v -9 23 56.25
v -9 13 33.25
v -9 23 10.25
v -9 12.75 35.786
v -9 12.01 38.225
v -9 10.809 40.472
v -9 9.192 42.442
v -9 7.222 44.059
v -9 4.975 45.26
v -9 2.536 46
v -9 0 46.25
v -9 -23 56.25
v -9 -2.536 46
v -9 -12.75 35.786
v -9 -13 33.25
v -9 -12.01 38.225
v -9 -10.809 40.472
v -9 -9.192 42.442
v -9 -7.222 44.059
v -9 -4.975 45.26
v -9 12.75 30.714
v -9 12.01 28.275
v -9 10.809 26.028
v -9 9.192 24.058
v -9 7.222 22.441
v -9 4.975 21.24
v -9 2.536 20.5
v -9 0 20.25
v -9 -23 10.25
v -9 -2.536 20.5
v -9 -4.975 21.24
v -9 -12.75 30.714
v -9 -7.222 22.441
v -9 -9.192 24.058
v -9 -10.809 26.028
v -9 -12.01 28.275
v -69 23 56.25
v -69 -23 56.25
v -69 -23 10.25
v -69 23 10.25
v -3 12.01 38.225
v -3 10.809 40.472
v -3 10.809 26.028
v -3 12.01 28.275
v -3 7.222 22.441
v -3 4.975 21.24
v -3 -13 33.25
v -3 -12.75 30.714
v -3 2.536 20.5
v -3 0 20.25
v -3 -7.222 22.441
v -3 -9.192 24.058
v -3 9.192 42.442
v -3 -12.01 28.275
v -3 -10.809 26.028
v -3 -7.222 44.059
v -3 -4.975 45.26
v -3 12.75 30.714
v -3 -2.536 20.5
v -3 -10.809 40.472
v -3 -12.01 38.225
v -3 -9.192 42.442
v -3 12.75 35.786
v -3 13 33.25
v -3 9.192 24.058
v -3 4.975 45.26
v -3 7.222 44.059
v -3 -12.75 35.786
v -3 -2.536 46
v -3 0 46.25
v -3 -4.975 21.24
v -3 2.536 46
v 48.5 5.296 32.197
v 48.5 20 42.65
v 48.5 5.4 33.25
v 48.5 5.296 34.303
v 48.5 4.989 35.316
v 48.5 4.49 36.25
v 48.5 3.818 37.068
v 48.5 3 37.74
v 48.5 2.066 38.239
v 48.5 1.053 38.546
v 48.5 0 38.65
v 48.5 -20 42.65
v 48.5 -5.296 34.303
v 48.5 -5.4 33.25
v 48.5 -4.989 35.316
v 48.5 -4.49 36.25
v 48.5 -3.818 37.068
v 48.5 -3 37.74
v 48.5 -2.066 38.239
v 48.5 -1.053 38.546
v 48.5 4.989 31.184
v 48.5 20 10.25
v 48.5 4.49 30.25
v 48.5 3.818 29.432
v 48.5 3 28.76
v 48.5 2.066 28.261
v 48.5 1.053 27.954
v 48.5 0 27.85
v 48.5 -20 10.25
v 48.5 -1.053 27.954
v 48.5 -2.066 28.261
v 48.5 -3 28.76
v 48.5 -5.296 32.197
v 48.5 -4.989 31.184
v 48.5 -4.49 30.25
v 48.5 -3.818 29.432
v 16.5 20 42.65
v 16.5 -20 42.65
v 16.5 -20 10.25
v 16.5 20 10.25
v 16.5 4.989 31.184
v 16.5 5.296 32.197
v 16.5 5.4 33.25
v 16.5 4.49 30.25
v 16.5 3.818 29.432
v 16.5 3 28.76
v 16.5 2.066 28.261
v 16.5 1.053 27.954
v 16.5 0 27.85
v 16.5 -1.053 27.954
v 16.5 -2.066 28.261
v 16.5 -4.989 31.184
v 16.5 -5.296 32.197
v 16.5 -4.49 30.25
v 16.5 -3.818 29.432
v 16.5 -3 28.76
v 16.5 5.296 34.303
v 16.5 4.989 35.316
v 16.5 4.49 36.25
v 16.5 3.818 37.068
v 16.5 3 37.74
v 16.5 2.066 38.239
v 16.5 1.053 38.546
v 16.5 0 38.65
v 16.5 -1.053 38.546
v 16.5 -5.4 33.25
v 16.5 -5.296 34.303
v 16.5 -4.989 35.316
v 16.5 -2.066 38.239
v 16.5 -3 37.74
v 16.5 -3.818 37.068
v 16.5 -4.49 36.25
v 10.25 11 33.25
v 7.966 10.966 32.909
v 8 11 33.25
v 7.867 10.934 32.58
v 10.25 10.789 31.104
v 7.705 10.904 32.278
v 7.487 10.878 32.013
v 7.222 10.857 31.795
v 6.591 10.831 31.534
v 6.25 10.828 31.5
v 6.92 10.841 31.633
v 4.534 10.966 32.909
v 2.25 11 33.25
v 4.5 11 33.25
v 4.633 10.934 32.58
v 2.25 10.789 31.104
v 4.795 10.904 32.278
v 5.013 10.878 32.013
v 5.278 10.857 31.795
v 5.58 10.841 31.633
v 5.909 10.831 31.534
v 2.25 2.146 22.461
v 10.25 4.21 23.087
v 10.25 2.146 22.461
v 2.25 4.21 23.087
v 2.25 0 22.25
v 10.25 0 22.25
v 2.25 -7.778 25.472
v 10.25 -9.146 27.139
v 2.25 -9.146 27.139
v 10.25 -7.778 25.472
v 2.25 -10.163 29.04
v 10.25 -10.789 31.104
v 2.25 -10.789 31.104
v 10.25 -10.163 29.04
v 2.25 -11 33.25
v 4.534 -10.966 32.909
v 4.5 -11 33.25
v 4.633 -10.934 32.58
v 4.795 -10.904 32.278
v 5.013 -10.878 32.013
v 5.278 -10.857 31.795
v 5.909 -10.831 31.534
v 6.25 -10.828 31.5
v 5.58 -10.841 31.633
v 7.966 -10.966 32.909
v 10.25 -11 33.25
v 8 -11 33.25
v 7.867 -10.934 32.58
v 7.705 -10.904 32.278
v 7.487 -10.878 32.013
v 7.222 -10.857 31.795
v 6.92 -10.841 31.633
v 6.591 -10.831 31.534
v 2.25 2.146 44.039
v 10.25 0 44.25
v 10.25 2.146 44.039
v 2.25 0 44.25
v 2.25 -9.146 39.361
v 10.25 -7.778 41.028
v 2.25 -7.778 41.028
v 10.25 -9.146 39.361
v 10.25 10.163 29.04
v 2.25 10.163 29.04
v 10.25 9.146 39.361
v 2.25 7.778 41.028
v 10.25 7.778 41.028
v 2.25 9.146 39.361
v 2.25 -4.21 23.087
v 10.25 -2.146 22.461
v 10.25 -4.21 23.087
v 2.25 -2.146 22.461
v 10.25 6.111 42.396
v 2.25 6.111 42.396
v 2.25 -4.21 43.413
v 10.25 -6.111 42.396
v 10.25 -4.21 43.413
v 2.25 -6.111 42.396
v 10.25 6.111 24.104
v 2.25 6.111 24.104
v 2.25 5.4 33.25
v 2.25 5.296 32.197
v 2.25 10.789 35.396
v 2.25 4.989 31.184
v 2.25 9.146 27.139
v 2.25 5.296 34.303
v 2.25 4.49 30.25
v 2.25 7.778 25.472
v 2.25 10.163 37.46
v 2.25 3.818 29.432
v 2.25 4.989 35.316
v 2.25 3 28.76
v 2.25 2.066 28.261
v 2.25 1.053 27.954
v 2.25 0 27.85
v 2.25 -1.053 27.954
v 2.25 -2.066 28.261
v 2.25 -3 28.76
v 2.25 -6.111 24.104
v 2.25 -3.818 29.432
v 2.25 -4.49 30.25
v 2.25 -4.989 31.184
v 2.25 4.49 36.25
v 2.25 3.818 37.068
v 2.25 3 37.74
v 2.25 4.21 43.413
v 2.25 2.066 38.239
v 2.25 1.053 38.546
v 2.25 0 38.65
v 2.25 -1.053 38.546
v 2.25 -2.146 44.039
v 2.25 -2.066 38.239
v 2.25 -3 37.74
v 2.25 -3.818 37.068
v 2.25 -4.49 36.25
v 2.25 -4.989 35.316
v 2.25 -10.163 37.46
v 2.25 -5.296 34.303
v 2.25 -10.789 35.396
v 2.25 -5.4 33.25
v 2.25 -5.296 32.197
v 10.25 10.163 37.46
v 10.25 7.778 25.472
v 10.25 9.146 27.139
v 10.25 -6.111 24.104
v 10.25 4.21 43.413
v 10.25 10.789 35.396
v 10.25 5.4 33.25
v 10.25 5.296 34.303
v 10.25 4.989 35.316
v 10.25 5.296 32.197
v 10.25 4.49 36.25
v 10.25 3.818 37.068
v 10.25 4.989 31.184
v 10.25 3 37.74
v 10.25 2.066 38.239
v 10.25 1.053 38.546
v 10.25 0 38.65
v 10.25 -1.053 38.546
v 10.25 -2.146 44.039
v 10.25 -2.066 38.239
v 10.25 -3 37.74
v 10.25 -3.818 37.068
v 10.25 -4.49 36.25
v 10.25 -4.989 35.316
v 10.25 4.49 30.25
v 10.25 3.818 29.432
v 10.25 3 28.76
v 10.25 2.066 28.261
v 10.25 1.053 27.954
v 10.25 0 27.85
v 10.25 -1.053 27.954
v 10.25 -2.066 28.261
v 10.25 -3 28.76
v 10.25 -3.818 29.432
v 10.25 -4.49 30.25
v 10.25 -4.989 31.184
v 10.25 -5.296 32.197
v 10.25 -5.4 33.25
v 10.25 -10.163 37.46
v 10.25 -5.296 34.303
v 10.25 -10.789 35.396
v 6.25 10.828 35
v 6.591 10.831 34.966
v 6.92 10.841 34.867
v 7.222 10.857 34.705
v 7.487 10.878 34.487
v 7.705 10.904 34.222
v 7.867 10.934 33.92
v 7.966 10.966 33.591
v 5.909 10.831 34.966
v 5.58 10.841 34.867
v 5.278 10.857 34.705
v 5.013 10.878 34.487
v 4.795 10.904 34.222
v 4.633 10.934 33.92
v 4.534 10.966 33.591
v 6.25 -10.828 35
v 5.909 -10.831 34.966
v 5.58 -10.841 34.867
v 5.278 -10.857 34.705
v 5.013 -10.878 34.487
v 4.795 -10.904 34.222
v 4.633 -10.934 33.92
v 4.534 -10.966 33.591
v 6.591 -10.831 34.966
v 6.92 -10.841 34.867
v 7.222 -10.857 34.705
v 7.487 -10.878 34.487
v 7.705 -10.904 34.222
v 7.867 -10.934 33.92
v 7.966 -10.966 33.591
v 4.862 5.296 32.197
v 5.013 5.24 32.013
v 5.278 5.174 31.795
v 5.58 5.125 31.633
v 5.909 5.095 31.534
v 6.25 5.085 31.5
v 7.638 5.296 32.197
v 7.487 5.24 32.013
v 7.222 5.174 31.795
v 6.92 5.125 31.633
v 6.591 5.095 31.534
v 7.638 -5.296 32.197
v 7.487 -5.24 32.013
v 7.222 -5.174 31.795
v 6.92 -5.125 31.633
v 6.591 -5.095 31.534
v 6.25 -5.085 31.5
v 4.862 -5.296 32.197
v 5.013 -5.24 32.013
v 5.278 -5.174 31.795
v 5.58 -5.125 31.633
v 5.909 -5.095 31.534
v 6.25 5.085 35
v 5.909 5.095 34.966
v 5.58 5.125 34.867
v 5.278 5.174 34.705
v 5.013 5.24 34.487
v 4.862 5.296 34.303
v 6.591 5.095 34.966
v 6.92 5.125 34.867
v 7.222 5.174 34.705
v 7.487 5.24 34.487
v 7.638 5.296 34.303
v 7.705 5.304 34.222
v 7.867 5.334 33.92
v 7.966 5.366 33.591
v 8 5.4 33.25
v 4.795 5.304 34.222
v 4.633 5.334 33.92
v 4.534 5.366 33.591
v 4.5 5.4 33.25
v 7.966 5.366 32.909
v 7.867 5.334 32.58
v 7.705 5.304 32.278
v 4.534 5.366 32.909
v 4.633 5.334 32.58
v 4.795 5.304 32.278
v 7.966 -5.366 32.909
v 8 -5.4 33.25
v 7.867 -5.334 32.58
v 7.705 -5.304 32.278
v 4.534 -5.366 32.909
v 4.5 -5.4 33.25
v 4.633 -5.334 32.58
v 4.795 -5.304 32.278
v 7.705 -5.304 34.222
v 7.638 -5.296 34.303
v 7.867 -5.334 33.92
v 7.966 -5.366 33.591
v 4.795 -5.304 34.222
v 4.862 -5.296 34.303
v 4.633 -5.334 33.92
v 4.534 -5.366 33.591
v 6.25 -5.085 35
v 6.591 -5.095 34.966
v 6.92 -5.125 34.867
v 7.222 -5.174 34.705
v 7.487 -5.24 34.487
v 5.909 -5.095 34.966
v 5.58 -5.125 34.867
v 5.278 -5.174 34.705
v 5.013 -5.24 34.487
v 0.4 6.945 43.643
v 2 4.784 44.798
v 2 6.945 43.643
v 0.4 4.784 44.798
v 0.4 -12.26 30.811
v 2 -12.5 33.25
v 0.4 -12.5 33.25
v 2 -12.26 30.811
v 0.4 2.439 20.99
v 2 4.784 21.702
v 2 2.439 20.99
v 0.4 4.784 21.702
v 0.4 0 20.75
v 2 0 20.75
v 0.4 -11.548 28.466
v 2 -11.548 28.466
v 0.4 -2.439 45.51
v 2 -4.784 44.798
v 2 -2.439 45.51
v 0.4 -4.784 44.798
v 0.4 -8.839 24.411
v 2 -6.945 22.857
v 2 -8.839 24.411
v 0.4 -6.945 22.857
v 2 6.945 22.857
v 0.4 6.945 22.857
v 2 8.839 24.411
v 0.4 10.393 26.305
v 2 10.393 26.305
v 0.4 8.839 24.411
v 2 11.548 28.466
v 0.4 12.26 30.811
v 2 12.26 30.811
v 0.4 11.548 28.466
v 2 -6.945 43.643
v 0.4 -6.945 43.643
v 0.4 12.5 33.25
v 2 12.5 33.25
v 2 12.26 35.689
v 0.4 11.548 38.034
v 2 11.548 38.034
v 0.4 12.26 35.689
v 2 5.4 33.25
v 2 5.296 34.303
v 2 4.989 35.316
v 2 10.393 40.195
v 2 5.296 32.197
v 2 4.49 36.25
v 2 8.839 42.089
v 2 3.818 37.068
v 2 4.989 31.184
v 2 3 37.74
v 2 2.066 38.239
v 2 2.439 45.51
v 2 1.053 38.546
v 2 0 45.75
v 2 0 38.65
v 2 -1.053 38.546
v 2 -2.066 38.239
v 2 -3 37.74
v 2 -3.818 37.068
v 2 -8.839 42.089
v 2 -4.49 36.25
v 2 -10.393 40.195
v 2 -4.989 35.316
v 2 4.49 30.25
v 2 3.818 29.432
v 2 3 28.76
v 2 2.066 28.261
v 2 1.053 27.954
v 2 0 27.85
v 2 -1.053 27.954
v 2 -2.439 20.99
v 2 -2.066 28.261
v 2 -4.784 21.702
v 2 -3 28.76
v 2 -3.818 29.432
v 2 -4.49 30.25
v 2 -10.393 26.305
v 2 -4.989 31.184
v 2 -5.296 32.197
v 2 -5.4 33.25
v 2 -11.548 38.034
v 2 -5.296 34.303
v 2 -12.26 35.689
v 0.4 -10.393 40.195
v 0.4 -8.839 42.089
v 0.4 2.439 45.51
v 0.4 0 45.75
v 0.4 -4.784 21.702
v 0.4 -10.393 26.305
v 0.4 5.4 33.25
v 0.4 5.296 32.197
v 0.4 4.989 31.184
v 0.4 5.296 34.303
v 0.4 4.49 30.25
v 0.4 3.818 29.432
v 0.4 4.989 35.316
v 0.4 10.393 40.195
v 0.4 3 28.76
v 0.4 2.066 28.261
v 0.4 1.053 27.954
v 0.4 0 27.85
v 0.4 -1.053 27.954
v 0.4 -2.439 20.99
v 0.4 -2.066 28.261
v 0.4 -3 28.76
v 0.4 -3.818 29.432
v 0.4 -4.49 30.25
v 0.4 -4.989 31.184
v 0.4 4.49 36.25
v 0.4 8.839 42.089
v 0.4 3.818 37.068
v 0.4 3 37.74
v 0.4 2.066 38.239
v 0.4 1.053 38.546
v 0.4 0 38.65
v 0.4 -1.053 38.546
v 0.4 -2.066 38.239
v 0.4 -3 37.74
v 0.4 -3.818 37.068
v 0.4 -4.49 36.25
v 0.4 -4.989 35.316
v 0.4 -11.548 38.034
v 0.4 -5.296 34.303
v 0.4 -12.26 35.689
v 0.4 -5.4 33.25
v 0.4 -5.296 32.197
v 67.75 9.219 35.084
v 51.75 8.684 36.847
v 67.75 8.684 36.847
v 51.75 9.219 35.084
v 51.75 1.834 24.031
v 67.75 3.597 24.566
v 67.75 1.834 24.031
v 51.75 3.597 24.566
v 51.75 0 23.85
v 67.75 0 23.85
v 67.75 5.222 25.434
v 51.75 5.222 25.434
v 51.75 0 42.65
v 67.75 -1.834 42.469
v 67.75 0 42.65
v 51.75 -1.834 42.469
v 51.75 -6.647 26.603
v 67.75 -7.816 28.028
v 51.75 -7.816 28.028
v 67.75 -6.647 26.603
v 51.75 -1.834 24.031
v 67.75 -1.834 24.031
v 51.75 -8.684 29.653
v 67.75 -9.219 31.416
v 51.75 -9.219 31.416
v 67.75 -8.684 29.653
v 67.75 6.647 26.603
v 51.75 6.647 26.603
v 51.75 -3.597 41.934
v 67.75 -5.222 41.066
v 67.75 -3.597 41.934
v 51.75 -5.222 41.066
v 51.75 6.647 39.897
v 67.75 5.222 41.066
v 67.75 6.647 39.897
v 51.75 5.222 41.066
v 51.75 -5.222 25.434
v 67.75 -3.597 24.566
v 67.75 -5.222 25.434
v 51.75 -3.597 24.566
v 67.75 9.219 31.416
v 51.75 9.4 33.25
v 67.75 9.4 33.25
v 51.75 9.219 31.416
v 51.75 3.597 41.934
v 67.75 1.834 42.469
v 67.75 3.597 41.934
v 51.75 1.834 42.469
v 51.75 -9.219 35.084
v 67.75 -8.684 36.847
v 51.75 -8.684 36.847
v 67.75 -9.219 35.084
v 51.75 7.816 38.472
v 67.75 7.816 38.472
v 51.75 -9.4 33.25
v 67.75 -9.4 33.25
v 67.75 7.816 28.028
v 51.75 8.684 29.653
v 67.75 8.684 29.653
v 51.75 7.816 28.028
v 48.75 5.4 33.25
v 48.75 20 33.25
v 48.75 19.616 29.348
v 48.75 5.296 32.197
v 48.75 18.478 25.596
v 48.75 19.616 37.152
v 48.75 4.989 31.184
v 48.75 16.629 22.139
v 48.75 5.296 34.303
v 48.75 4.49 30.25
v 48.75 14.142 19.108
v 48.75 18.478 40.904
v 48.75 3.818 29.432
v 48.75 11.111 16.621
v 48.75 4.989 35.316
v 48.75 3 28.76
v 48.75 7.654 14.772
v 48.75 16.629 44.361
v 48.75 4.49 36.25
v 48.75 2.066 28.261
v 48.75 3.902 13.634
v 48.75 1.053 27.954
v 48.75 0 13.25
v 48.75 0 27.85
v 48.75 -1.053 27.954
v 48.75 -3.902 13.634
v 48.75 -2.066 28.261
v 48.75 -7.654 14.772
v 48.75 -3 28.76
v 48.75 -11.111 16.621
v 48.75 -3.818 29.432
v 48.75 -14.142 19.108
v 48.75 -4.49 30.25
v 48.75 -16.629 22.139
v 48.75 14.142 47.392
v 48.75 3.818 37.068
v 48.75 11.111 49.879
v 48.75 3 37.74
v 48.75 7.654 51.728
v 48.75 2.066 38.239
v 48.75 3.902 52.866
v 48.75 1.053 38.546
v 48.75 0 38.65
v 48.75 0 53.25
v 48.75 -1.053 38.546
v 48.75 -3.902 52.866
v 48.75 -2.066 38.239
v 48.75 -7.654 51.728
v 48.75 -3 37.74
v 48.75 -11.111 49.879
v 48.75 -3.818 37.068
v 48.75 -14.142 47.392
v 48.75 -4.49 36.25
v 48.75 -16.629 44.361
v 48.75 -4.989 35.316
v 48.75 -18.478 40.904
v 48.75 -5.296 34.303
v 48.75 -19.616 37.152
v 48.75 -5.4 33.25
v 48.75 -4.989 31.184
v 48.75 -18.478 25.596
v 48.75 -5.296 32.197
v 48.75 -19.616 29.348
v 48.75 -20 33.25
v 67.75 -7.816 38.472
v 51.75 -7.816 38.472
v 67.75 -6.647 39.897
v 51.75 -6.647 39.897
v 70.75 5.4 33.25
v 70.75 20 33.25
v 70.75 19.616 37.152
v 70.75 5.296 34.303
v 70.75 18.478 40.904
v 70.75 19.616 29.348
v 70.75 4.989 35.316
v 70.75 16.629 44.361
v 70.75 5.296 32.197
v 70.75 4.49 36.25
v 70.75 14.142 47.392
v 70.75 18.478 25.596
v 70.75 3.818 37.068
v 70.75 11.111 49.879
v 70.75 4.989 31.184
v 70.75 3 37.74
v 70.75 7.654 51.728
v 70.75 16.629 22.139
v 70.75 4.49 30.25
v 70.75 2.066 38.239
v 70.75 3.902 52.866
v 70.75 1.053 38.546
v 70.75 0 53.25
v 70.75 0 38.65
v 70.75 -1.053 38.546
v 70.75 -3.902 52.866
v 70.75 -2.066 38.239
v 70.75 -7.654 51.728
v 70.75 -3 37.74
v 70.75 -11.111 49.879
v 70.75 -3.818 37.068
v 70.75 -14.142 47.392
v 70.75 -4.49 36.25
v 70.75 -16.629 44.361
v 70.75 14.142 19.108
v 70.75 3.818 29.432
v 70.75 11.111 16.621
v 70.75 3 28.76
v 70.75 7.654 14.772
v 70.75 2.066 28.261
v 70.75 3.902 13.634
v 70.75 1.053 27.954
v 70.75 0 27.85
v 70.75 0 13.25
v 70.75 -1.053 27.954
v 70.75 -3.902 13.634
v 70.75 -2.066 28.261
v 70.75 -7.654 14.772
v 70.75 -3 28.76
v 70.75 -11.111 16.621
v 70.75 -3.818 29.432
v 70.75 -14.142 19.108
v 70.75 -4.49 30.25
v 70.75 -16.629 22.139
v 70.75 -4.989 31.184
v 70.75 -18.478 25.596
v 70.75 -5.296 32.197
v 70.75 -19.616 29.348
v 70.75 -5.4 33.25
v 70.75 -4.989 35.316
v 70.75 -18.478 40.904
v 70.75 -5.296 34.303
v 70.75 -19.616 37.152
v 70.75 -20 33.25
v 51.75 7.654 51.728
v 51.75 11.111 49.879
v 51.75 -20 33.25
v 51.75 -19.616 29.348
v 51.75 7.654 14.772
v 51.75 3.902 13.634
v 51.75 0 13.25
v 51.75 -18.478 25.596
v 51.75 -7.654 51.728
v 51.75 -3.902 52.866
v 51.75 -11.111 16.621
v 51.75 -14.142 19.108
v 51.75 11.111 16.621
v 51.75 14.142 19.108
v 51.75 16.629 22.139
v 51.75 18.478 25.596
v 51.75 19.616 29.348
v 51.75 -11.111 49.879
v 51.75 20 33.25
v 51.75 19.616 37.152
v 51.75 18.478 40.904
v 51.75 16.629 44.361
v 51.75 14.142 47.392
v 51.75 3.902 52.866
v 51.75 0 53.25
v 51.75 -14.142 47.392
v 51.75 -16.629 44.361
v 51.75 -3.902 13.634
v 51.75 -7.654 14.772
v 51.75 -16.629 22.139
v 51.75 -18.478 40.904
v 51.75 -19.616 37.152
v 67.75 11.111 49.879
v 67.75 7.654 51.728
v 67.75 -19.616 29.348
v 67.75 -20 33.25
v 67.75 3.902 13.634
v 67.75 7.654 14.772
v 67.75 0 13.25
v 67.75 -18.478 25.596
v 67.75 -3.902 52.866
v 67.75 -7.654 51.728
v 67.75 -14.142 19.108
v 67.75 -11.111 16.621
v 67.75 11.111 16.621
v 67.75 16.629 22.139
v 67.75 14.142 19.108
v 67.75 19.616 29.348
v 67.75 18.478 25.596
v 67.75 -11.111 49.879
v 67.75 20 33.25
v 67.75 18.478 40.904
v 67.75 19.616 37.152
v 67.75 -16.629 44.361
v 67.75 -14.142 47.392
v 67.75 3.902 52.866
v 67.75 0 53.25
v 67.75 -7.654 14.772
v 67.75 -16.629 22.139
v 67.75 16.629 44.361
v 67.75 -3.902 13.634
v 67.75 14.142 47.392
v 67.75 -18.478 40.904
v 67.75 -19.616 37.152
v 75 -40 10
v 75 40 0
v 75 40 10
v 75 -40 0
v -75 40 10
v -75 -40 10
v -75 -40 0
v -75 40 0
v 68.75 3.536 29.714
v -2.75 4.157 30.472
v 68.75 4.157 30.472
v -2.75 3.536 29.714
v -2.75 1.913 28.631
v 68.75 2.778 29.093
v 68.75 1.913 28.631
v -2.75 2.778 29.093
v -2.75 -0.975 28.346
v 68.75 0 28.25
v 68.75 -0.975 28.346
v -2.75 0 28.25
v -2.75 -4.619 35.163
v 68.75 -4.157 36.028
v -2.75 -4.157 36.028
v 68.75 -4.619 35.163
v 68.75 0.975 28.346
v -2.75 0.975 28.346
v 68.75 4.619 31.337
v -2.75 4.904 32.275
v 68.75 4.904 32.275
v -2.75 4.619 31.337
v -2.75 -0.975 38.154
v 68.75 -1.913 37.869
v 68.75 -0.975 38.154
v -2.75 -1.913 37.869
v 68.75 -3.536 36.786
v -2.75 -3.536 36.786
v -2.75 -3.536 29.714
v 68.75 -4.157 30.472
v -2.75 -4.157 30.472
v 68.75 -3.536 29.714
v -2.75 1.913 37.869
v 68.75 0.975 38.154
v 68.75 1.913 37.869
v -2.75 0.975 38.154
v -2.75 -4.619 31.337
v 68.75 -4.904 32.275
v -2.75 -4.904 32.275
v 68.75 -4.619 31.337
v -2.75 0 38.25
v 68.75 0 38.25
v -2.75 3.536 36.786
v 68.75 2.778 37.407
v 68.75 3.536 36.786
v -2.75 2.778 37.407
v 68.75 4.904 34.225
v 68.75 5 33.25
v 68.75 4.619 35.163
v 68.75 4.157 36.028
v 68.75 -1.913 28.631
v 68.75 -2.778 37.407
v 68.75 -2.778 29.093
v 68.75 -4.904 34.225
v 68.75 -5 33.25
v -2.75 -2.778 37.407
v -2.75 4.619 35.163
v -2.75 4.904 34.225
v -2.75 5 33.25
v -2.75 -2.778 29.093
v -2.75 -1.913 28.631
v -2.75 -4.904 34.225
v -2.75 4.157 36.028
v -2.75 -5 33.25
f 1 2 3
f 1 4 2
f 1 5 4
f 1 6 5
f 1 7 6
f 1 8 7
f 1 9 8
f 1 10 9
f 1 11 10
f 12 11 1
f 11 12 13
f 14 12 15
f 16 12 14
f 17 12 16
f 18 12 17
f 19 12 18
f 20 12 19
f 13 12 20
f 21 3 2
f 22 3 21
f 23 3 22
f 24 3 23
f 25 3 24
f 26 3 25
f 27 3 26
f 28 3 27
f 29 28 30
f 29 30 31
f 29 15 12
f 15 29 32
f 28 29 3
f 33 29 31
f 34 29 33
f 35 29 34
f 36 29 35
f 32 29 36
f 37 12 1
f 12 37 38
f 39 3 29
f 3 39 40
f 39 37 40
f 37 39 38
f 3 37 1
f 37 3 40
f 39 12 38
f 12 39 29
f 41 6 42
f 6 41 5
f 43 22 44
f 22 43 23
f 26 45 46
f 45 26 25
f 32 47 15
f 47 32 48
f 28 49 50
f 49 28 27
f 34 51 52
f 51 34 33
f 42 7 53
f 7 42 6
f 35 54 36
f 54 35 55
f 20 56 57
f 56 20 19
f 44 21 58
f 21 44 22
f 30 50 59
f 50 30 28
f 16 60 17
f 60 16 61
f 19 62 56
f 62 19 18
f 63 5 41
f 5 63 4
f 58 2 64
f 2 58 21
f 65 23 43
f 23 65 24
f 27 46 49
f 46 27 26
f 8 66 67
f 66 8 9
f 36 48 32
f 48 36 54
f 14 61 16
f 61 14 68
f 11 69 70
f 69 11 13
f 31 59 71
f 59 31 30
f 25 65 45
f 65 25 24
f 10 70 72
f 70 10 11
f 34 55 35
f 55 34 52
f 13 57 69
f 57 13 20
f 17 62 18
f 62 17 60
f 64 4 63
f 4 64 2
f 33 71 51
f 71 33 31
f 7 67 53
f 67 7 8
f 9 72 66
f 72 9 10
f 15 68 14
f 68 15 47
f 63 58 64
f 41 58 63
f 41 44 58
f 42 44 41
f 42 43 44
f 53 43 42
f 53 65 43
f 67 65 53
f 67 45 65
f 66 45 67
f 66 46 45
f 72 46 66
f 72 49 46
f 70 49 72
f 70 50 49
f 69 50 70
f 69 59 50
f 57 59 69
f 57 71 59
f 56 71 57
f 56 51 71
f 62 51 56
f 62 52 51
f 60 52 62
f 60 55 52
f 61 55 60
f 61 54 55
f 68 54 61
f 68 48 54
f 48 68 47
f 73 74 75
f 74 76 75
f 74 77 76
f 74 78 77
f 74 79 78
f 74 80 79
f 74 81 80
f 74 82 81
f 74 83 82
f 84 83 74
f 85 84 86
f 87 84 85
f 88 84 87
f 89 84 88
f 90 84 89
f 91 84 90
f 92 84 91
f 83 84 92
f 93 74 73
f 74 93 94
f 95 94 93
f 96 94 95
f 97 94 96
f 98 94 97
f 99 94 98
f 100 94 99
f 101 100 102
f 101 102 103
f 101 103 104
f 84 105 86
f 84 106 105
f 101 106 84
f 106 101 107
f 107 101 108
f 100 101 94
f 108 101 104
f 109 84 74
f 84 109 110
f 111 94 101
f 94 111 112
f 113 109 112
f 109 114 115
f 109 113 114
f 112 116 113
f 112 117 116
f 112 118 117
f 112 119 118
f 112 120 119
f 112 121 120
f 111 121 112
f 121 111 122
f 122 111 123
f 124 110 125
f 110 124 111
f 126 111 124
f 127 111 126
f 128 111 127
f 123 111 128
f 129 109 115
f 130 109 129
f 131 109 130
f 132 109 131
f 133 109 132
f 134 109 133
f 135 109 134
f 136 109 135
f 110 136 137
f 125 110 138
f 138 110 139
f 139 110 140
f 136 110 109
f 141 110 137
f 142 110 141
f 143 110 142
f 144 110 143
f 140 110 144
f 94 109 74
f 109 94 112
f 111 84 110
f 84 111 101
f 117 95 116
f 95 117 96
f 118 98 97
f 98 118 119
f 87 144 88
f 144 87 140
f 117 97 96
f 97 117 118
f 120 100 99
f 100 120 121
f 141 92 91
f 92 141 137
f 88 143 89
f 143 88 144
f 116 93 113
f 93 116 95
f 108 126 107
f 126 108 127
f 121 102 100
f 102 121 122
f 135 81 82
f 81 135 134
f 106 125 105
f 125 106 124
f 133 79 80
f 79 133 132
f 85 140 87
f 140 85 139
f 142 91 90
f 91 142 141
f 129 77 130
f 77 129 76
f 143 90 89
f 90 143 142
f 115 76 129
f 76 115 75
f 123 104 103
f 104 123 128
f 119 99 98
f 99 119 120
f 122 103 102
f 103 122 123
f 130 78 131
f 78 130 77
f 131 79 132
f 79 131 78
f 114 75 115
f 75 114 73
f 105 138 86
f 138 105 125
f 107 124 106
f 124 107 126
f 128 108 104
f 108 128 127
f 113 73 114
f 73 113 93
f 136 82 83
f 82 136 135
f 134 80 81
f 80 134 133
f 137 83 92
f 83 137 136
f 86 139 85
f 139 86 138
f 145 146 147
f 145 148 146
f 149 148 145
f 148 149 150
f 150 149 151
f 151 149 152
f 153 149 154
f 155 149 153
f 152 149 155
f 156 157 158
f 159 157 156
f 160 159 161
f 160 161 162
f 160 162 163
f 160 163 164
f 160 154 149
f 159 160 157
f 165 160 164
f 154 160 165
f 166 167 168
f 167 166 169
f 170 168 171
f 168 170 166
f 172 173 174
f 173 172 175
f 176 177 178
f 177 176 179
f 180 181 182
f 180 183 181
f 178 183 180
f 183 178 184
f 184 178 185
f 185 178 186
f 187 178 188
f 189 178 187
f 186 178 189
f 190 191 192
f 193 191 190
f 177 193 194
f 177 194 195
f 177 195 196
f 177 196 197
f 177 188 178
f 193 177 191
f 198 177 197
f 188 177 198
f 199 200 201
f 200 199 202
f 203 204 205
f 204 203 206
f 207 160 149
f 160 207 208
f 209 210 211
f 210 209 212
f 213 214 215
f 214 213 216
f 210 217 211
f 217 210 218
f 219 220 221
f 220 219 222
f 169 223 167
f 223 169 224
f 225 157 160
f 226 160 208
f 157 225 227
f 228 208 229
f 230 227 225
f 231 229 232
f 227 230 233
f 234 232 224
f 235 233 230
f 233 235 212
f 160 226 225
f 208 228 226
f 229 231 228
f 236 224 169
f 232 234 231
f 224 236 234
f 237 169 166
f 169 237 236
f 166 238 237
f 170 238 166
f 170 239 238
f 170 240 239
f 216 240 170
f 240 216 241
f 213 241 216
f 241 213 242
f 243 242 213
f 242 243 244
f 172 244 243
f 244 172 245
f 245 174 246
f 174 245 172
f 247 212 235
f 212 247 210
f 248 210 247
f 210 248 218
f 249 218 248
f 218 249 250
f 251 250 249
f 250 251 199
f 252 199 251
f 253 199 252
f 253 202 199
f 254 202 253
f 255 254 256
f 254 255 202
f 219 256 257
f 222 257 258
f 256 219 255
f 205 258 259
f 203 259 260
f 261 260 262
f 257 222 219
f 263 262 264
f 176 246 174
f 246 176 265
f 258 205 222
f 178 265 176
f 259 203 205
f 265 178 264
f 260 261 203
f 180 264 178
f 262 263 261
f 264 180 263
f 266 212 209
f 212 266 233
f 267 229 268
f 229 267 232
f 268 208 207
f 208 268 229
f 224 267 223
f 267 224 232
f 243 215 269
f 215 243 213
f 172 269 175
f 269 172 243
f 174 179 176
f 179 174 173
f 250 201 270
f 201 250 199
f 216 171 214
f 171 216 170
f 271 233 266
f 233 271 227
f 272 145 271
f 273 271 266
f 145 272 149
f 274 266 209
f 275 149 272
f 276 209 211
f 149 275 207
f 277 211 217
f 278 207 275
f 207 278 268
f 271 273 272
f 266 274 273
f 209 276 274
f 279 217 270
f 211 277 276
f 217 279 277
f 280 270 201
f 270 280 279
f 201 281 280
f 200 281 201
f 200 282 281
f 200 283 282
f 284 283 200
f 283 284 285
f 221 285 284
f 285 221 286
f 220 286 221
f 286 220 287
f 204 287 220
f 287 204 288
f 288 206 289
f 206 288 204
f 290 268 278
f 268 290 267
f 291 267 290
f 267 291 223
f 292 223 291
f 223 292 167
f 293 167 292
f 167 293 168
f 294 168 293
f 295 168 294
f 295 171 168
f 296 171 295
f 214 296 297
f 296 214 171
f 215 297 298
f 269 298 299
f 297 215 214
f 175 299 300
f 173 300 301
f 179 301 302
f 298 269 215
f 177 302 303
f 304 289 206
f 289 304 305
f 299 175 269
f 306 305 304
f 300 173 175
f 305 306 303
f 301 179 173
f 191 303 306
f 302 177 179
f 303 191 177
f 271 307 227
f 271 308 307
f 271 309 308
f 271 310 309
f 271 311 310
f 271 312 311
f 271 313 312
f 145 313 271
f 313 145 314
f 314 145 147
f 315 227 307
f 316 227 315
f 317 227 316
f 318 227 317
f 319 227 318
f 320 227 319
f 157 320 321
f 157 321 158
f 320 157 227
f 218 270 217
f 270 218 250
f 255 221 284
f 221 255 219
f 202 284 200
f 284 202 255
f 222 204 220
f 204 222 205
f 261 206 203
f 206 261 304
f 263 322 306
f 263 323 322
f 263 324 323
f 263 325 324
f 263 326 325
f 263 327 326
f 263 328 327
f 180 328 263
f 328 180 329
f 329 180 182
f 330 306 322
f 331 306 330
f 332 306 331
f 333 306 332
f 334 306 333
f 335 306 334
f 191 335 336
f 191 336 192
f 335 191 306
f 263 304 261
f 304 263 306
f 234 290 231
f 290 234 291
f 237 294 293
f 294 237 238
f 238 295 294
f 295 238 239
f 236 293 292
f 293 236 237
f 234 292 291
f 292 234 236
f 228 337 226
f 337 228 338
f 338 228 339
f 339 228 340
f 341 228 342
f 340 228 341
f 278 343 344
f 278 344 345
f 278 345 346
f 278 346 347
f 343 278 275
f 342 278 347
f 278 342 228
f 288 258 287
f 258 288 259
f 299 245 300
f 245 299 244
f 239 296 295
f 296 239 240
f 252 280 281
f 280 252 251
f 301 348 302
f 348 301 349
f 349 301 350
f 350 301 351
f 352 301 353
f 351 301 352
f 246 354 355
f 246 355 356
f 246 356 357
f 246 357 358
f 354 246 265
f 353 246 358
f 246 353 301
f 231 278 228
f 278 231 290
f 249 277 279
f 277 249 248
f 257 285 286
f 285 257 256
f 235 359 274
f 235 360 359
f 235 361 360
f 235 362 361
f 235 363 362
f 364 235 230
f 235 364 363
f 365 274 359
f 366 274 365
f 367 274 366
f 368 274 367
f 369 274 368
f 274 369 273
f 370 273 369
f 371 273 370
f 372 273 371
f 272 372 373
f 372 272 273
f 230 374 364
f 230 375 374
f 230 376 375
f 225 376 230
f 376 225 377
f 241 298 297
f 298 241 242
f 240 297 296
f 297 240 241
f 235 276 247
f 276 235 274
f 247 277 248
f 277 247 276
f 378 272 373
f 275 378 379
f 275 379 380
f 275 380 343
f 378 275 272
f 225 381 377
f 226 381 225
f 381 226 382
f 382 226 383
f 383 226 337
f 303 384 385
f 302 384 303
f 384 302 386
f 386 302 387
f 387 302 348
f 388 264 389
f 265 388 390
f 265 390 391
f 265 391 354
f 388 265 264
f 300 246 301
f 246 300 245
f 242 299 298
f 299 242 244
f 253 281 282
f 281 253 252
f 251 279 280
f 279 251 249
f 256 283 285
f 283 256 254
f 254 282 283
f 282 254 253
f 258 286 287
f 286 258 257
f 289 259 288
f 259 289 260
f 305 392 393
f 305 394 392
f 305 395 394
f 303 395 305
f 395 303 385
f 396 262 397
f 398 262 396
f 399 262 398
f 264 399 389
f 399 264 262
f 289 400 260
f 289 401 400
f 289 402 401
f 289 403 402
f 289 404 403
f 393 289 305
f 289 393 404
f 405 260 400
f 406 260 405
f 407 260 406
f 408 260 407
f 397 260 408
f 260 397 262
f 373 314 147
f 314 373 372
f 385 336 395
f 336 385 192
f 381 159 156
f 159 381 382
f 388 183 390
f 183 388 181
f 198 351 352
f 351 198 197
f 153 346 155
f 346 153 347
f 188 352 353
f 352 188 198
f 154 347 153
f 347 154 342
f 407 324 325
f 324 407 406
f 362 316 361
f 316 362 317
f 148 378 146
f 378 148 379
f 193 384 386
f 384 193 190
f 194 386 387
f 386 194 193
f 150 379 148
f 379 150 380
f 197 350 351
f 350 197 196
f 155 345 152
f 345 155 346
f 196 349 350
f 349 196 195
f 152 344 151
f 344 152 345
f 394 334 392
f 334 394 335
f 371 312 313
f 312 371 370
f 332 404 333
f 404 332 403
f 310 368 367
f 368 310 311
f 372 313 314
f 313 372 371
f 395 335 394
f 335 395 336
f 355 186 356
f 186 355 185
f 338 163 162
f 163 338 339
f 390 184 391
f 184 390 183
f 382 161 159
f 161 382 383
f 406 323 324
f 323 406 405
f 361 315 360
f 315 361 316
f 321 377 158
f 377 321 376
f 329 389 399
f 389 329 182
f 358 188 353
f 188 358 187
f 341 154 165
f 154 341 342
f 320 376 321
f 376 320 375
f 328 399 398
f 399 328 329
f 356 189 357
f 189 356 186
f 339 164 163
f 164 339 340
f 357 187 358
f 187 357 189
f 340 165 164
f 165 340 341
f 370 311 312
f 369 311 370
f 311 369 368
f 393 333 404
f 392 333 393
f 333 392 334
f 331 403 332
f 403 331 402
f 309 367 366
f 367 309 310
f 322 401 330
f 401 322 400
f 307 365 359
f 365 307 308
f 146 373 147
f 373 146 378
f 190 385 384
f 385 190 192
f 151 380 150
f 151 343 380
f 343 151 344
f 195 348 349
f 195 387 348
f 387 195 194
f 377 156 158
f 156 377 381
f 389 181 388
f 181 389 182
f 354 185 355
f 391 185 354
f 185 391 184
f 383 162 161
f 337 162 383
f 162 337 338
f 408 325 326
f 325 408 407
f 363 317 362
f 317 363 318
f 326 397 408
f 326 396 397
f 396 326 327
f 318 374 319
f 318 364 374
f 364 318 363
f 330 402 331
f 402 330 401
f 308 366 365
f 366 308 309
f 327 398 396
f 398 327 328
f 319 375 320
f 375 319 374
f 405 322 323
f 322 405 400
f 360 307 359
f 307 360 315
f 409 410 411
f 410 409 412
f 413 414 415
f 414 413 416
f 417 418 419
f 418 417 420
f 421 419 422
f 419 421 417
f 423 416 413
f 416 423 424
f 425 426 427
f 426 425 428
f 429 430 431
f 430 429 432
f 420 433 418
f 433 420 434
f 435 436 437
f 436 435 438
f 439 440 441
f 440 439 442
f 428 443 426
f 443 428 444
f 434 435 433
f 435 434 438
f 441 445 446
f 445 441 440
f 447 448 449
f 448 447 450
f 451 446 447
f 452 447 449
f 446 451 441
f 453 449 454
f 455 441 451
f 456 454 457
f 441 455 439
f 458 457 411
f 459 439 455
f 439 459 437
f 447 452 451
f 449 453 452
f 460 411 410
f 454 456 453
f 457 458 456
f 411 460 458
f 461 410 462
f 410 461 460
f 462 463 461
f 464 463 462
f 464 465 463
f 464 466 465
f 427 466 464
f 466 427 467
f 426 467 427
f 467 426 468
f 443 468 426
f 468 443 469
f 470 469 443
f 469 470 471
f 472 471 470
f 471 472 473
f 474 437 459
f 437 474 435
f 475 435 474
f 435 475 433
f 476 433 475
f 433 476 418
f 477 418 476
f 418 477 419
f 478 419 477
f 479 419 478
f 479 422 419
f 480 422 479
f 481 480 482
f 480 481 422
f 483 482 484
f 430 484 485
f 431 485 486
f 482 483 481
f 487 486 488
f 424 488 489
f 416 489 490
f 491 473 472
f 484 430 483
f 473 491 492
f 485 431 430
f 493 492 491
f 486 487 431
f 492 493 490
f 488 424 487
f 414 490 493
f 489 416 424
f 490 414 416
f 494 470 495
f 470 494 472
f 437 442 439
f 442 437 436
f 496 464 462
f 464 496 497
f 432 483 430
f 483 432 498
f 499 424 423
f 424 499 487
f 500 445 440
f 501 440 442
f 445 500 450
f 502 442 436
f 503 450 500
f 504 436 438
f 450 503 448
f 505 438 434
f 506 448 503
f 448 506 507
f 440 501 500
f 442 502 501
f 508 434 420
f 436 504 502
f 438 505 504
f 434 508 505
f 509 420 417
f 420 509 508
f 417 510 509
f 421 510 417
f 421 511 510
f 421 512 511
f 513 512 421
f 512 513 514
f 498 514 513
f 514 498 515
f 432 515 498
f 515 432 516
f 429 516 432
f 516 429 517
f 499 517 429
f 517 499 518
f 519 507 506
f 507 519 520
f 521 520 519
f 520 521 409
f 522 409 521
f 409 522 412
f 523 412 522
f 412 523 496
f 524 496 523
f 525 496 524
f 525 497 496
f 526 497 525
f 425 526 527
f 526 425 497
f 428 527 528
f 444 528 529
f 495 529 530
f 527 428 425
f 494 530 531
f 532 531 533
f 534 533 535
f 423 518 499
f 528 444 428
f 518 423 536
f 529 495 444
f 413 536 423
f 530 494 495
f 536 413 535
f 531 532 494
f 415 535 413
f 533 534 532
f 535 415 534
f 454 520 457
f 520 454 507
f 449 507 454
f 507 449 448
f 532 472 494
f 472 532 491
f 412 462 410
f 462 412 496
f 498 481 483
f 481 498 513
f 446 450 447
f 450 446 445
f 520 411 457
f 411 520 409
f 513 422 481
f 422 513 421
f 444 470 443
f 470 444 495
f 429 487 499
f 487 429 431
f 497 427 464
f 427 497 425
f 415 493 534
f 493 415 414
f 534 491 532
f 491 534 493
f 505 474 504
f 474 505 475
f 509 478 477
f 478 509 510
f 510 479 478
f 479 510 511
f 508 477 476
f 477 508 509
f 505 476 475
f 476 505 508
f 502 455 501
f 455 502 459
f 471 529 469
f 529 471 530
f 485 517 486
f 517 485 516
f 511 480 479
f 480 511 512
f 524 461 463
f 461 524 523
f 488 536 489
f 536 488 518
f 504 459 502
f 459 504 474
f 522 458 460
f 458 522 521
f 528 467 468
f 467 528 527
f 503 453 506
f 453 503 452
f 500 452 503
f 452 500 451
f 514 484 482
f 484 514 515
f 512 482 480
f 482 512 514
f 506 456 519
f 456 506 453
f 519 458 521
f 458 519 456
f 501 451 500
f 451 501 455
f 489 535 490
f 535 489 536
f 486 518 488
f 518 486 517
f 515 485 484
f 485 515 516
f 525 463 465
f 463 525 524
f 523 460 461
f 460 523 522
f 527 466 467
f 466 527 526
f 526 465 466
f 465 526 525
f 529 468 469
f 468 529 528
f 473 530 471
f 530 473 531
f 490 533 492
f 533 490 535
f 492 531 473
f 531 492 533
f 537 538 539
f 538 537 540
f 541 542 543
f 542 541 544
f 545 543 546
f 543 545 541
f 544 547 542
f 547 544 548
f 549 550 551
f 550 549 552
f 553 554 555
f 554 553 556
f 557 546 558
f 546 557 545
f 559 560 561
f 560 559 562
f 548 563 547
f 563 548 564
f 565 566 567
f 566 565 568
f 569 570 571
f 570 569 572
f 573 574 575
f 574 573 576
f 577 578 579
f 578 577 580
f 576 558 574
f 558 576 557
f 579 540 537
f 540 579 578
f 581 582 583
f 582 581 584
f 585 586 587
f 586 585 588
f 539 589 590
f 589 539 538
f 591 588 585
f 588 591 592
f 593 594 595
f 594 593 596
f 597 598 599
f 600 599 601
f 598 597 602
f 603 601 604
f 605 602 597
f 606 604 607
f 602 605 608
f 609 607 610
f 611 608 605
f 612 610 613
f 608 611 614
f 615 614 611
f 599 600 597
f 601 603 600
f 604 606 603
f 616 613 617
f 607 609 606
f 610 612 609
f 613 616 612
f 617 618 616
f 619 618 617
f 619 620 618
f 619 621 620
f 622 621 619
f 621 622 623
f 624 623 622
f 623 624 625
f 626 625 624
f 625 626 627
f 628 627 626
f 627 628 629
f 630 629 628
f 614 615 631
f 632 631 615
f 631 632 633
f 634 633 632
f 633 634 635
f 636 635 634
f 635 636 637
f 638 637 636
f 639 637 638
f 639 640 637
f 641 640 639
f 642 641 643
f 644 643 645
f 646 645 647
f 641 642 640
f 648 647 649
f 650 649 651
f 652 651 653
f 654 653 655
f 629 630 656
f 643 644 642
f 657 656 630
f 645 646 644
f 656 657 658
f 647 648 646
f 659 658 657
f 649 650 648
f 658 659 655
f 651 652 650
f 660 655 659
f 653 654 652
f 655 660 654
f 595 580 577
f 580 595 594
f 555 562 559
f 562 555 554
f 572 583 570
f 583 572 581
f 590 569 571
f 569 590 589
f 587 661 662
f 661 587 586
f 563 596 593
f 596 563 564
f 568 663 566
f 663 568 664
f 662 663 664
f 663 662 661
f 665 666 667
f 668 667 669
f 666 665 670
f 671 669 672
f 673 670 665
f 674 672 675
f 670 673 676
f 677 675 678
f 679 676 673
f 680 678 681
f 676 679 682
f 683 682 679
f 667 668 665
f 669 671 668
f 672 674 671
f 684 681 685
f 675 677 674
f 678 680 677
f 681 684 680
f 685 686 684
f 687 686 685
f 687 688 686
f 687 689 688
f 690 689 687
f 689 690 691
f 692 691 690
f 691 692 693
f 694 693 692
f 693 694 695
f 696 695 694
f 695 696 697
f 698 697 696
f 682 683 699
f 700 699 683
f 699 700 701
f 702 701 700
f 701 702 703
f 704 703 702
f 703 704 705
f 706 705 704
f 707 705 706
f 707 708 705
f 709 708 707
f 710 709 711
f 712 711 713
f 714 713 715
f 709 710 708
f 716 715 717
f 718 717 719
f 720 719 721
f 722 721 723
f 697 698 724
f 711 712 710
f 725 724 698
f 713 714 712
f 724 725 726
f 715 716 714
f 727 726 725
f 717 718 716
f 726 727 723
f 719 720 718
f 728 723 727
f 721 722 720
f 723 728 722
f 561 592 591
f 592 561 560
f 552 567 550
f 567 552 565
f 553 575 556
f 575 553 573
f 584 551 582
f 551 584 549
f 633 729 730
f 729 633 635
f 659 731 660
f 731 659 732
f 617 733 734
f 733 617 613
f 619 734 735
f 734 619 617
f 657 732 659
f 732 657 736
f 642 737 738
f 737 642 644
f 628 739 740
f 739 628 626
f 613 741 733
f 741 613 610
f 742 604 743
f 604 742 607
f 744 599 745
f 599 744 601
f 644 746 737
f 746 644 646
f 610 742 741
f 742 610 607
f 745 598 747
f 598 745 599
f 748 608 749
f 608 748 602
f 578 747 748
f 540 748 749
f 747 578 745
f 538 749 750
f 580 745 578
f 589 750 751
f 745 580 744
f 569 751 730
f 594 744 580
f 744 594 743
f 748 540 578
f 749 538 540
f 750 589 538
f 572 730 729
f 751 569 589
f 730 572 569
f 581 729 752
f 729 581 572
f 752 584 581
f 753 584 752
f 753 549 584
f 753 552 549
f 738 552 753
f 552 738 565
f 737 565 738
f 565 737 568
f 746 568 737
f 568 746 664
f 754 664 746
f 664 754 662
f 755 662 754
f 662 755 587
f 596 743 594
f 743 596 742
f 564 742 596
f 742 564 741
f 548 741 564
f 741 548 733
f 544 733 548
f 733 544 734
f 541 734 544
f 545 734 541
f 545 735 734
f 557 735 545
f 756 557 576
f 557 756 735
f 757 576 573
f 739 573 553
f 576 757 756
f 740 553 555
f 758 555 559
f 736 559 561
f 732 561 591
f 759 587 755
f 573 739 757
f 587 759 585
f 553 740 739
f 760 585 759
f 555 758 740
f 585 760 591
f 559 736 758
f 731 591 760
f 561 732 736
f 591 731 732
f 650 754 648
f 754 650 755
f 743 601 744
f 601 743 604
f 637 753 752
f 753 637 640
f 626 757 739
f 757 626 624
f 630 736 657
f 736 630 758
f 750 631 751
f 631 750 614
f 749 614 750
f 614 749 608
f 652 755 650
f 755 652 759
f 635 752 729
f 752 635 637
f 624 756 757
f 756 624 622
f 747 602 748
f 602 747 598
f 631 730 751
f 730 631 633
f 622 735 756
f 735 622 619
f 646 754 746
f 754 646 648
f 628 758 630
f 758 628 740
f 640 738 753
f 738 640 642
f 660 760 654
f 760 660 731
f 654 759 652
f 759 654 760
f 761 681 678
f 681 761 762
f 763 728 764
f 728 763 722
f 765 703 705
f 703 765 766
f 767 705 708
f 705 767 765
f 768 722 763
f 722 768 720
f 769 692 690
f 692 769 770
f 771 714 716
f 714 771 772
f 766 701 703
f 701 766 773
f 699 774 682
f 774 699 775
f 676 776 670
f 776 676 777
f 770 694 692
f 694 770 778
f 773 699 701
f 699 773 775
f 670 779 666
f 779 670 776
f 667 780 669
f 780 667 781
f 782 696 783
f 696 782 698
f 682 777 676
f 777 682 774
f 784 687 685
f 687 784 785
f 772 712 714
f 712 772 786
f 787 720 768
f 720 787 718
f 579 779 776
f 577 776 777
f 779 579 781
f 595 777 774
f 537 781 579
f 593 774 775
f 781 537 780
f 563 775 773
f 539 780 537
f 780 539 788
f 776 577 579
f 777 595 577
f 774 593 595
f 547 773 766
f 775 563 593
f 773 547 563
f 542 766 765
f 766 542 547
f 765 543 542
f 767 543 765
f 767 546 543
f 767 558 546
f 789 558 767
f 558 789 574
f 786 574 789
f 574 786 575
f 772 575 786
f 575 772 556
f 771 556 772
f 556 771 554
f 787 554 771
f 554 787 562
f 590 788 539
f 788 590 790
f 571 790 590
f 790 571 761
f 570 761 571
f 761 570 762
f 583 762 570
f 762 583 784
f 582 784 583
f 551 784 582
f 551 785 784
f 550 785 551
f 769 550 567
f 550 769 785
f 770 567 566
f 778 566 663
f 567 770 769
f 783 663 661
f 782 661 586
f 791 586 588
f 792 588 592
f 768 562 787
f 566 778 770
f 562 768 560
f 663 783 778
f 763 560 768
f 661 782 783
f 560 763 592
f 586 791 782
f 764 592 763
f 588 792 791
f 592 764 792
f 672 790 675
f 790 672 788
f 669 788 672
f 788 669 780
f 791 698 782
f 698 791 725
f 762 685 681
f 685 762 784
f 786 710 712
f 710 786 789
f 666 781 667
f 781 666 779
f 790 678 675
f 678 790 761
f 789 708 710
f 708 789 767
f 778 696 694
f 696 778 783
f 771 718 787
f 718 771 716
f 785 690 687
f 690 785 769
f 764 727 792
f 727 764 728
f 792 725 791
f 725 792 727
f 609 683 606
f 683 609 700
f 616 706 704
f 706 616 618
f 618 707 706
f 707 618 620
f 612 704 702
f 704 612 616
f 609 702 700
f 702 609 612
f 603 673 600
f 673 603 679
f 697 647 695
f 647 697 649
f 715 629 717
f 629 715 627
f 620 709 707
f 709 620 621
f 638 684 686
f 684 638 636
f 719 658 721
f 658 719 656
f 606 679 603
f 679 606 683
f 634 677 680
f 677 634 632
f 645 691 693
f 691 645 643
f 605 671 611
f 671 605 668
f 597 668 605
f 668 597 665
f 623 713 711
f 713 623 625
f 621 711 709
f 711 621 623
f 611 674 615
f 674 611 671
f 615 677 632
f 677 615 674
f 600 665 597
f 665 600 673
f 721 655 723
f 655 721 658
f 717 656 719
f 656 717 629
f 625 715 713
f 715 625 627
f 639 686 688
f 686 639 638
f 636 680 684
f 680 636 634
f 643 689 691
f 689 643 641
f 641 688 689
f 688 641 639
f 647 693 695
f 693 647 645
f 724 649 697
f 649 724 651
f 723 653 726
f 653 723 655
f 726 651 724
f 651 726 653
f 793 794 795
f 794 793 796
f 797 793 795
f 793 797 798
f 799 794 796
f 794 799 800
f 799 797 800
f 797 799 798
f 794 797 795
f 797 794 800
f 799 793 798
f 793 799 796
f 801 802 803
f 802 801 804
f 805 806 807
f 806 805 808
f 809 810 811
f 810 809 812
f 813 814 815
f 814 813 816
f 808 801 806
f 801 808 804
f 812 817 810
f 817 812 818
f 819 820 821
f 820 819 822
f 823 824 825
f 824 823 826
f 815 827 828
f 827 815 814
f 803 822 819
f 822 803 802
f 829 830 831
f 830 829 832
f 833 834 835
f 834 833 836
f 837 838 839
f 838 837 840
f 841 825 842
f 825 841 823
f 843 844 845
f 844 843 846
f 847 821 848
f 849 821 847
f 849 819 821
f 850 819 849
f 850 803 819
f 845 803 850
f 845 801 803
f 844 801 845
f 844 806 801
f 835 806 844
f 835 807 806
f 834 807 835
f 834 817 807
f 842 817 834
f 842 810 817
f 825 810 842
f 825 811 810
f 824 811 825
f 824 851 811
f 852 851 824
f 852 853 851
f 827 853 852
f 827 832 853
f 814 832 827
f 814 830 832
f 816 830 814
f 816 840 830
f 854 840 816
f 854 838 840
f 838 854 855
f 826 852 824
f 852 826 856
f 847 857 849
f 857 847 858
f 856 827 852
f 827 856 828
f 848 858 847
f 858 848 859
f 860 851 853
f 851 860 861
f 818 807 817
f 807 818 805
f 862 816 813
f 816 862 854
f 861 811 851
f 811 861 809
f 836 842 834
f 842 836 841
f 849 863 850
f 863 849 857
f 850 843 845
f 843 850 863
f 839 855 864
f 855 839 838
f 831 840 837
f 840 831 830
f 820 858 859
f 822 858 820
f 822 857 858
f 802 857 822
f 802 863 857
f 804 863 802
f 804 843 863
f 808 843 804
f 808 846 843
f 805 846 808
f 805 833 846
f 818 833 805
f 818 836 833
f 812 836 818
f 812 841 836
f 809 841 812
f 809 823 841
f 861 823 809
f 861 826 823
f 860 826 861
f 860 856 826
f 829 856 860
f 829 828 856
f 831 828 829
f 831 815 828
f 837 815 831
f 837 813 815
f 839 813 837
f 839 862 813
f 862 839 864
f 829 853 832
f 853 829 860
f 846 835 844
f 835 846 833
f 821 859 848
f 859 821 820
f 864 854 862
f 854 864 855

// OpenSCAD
$fn = 32;

// ------------------------------------------------------------------------
// Motor drive station: motor 60 x 46 mm, shaft d10, pulley d40
// Every part is its own module, assembly() places every instance.
// ------------------------------------------------------------------------

// --- part 1 ---
module station_bed() {
  difference() {
    translate([-75, -40, 0]) cube([150, 80, 10]);
  }
}

// --- part 2 ---
module drive_motor() {
  union() {
    translate([-30, -23, 0]) cube([60, 46, 46]);
    translate([33, 0, 23]) rotate([0, 90, 0]) cylinder(h = 6, d = 26, center = true);
  }
}

// --- part 3 ---
module pillow_block() {
  difference() {
    translate([-16, -20, 0]) cube([32, 40, 32.4]);
    translate([0, 0, 23]) rotate([0, 90, 0]) cylinder(h = 34, d = 10.8, center = true);
  }
}

// --- part 4 ---
module drive_shaft() {
  translate([0, 0, -35.75]) cylinder(h = 71.5, d = 10);
}

// --- part 5 ---
module shaft_collar() {
  difference() {
    cylinder(h = 8, d = 22);
    translate([0, 0, -1]) cylinder(h = 10, d = 10.8);
    translate([0, 0, 4]) rotate([90, 0, 0]) cylinder(h = 24, d = 3.5, center = true);
  }
}

// --- part 6 ---
module collar_washer() {
  difference() {
      translate([0, 0, 0]) cylinder(h = 1.6, d = 25);
      translate([0, 0, -1]) cylinder(h = 3.6, d = 10.8);
    }
}

// --- part 7 ---
module drive_pulley() {
  difference() {
    union() {
      cylinder(h = 22, d = 18.8);
      cylinder(h = 3, d = 40);
      translate([0, 0, 19]) cylinder(h = 3, d = 40);
    }
    translate([0, 0, -1]) cylinder(h = 24, d = 10.8);
  }
}

// --- assembly ---
module assembly() {
  color([0.80, 0.24, 0.20]) translate([0, 0, 0]) rotate([0, 0, 0]) station_bed();
  color([0.20, 0.45, 0.75]) translate([-39, 0, 10.25]) rotate([0, 0, 0]) drive_motor();
  color([0.25, 0.62, 0.32]) translate([32.5, 0, 10.25]) rotate([0, 0, 0]) pillow_block();
  color([0.92, 0.70, 0.18]) translate([33, 0, 33.25]) rotate([0, 90, 0]) drive_shaft();
  color([0.58, 0.35, 0.70]) translate([2.25, 0, 33.25]) rotate([0, 90, 0]) shaft_collar();
  color([0.16, 0.66, 0.66]) translate([0.4, 0, 33.25]) rotate([0, 90, 0]) collar_washer();
  color([0.85, 0.48, 0.18]) translate([48.75, 0, 33.25]) rotate([0, 90, 0]) drive_pulley();
}

assembly();
